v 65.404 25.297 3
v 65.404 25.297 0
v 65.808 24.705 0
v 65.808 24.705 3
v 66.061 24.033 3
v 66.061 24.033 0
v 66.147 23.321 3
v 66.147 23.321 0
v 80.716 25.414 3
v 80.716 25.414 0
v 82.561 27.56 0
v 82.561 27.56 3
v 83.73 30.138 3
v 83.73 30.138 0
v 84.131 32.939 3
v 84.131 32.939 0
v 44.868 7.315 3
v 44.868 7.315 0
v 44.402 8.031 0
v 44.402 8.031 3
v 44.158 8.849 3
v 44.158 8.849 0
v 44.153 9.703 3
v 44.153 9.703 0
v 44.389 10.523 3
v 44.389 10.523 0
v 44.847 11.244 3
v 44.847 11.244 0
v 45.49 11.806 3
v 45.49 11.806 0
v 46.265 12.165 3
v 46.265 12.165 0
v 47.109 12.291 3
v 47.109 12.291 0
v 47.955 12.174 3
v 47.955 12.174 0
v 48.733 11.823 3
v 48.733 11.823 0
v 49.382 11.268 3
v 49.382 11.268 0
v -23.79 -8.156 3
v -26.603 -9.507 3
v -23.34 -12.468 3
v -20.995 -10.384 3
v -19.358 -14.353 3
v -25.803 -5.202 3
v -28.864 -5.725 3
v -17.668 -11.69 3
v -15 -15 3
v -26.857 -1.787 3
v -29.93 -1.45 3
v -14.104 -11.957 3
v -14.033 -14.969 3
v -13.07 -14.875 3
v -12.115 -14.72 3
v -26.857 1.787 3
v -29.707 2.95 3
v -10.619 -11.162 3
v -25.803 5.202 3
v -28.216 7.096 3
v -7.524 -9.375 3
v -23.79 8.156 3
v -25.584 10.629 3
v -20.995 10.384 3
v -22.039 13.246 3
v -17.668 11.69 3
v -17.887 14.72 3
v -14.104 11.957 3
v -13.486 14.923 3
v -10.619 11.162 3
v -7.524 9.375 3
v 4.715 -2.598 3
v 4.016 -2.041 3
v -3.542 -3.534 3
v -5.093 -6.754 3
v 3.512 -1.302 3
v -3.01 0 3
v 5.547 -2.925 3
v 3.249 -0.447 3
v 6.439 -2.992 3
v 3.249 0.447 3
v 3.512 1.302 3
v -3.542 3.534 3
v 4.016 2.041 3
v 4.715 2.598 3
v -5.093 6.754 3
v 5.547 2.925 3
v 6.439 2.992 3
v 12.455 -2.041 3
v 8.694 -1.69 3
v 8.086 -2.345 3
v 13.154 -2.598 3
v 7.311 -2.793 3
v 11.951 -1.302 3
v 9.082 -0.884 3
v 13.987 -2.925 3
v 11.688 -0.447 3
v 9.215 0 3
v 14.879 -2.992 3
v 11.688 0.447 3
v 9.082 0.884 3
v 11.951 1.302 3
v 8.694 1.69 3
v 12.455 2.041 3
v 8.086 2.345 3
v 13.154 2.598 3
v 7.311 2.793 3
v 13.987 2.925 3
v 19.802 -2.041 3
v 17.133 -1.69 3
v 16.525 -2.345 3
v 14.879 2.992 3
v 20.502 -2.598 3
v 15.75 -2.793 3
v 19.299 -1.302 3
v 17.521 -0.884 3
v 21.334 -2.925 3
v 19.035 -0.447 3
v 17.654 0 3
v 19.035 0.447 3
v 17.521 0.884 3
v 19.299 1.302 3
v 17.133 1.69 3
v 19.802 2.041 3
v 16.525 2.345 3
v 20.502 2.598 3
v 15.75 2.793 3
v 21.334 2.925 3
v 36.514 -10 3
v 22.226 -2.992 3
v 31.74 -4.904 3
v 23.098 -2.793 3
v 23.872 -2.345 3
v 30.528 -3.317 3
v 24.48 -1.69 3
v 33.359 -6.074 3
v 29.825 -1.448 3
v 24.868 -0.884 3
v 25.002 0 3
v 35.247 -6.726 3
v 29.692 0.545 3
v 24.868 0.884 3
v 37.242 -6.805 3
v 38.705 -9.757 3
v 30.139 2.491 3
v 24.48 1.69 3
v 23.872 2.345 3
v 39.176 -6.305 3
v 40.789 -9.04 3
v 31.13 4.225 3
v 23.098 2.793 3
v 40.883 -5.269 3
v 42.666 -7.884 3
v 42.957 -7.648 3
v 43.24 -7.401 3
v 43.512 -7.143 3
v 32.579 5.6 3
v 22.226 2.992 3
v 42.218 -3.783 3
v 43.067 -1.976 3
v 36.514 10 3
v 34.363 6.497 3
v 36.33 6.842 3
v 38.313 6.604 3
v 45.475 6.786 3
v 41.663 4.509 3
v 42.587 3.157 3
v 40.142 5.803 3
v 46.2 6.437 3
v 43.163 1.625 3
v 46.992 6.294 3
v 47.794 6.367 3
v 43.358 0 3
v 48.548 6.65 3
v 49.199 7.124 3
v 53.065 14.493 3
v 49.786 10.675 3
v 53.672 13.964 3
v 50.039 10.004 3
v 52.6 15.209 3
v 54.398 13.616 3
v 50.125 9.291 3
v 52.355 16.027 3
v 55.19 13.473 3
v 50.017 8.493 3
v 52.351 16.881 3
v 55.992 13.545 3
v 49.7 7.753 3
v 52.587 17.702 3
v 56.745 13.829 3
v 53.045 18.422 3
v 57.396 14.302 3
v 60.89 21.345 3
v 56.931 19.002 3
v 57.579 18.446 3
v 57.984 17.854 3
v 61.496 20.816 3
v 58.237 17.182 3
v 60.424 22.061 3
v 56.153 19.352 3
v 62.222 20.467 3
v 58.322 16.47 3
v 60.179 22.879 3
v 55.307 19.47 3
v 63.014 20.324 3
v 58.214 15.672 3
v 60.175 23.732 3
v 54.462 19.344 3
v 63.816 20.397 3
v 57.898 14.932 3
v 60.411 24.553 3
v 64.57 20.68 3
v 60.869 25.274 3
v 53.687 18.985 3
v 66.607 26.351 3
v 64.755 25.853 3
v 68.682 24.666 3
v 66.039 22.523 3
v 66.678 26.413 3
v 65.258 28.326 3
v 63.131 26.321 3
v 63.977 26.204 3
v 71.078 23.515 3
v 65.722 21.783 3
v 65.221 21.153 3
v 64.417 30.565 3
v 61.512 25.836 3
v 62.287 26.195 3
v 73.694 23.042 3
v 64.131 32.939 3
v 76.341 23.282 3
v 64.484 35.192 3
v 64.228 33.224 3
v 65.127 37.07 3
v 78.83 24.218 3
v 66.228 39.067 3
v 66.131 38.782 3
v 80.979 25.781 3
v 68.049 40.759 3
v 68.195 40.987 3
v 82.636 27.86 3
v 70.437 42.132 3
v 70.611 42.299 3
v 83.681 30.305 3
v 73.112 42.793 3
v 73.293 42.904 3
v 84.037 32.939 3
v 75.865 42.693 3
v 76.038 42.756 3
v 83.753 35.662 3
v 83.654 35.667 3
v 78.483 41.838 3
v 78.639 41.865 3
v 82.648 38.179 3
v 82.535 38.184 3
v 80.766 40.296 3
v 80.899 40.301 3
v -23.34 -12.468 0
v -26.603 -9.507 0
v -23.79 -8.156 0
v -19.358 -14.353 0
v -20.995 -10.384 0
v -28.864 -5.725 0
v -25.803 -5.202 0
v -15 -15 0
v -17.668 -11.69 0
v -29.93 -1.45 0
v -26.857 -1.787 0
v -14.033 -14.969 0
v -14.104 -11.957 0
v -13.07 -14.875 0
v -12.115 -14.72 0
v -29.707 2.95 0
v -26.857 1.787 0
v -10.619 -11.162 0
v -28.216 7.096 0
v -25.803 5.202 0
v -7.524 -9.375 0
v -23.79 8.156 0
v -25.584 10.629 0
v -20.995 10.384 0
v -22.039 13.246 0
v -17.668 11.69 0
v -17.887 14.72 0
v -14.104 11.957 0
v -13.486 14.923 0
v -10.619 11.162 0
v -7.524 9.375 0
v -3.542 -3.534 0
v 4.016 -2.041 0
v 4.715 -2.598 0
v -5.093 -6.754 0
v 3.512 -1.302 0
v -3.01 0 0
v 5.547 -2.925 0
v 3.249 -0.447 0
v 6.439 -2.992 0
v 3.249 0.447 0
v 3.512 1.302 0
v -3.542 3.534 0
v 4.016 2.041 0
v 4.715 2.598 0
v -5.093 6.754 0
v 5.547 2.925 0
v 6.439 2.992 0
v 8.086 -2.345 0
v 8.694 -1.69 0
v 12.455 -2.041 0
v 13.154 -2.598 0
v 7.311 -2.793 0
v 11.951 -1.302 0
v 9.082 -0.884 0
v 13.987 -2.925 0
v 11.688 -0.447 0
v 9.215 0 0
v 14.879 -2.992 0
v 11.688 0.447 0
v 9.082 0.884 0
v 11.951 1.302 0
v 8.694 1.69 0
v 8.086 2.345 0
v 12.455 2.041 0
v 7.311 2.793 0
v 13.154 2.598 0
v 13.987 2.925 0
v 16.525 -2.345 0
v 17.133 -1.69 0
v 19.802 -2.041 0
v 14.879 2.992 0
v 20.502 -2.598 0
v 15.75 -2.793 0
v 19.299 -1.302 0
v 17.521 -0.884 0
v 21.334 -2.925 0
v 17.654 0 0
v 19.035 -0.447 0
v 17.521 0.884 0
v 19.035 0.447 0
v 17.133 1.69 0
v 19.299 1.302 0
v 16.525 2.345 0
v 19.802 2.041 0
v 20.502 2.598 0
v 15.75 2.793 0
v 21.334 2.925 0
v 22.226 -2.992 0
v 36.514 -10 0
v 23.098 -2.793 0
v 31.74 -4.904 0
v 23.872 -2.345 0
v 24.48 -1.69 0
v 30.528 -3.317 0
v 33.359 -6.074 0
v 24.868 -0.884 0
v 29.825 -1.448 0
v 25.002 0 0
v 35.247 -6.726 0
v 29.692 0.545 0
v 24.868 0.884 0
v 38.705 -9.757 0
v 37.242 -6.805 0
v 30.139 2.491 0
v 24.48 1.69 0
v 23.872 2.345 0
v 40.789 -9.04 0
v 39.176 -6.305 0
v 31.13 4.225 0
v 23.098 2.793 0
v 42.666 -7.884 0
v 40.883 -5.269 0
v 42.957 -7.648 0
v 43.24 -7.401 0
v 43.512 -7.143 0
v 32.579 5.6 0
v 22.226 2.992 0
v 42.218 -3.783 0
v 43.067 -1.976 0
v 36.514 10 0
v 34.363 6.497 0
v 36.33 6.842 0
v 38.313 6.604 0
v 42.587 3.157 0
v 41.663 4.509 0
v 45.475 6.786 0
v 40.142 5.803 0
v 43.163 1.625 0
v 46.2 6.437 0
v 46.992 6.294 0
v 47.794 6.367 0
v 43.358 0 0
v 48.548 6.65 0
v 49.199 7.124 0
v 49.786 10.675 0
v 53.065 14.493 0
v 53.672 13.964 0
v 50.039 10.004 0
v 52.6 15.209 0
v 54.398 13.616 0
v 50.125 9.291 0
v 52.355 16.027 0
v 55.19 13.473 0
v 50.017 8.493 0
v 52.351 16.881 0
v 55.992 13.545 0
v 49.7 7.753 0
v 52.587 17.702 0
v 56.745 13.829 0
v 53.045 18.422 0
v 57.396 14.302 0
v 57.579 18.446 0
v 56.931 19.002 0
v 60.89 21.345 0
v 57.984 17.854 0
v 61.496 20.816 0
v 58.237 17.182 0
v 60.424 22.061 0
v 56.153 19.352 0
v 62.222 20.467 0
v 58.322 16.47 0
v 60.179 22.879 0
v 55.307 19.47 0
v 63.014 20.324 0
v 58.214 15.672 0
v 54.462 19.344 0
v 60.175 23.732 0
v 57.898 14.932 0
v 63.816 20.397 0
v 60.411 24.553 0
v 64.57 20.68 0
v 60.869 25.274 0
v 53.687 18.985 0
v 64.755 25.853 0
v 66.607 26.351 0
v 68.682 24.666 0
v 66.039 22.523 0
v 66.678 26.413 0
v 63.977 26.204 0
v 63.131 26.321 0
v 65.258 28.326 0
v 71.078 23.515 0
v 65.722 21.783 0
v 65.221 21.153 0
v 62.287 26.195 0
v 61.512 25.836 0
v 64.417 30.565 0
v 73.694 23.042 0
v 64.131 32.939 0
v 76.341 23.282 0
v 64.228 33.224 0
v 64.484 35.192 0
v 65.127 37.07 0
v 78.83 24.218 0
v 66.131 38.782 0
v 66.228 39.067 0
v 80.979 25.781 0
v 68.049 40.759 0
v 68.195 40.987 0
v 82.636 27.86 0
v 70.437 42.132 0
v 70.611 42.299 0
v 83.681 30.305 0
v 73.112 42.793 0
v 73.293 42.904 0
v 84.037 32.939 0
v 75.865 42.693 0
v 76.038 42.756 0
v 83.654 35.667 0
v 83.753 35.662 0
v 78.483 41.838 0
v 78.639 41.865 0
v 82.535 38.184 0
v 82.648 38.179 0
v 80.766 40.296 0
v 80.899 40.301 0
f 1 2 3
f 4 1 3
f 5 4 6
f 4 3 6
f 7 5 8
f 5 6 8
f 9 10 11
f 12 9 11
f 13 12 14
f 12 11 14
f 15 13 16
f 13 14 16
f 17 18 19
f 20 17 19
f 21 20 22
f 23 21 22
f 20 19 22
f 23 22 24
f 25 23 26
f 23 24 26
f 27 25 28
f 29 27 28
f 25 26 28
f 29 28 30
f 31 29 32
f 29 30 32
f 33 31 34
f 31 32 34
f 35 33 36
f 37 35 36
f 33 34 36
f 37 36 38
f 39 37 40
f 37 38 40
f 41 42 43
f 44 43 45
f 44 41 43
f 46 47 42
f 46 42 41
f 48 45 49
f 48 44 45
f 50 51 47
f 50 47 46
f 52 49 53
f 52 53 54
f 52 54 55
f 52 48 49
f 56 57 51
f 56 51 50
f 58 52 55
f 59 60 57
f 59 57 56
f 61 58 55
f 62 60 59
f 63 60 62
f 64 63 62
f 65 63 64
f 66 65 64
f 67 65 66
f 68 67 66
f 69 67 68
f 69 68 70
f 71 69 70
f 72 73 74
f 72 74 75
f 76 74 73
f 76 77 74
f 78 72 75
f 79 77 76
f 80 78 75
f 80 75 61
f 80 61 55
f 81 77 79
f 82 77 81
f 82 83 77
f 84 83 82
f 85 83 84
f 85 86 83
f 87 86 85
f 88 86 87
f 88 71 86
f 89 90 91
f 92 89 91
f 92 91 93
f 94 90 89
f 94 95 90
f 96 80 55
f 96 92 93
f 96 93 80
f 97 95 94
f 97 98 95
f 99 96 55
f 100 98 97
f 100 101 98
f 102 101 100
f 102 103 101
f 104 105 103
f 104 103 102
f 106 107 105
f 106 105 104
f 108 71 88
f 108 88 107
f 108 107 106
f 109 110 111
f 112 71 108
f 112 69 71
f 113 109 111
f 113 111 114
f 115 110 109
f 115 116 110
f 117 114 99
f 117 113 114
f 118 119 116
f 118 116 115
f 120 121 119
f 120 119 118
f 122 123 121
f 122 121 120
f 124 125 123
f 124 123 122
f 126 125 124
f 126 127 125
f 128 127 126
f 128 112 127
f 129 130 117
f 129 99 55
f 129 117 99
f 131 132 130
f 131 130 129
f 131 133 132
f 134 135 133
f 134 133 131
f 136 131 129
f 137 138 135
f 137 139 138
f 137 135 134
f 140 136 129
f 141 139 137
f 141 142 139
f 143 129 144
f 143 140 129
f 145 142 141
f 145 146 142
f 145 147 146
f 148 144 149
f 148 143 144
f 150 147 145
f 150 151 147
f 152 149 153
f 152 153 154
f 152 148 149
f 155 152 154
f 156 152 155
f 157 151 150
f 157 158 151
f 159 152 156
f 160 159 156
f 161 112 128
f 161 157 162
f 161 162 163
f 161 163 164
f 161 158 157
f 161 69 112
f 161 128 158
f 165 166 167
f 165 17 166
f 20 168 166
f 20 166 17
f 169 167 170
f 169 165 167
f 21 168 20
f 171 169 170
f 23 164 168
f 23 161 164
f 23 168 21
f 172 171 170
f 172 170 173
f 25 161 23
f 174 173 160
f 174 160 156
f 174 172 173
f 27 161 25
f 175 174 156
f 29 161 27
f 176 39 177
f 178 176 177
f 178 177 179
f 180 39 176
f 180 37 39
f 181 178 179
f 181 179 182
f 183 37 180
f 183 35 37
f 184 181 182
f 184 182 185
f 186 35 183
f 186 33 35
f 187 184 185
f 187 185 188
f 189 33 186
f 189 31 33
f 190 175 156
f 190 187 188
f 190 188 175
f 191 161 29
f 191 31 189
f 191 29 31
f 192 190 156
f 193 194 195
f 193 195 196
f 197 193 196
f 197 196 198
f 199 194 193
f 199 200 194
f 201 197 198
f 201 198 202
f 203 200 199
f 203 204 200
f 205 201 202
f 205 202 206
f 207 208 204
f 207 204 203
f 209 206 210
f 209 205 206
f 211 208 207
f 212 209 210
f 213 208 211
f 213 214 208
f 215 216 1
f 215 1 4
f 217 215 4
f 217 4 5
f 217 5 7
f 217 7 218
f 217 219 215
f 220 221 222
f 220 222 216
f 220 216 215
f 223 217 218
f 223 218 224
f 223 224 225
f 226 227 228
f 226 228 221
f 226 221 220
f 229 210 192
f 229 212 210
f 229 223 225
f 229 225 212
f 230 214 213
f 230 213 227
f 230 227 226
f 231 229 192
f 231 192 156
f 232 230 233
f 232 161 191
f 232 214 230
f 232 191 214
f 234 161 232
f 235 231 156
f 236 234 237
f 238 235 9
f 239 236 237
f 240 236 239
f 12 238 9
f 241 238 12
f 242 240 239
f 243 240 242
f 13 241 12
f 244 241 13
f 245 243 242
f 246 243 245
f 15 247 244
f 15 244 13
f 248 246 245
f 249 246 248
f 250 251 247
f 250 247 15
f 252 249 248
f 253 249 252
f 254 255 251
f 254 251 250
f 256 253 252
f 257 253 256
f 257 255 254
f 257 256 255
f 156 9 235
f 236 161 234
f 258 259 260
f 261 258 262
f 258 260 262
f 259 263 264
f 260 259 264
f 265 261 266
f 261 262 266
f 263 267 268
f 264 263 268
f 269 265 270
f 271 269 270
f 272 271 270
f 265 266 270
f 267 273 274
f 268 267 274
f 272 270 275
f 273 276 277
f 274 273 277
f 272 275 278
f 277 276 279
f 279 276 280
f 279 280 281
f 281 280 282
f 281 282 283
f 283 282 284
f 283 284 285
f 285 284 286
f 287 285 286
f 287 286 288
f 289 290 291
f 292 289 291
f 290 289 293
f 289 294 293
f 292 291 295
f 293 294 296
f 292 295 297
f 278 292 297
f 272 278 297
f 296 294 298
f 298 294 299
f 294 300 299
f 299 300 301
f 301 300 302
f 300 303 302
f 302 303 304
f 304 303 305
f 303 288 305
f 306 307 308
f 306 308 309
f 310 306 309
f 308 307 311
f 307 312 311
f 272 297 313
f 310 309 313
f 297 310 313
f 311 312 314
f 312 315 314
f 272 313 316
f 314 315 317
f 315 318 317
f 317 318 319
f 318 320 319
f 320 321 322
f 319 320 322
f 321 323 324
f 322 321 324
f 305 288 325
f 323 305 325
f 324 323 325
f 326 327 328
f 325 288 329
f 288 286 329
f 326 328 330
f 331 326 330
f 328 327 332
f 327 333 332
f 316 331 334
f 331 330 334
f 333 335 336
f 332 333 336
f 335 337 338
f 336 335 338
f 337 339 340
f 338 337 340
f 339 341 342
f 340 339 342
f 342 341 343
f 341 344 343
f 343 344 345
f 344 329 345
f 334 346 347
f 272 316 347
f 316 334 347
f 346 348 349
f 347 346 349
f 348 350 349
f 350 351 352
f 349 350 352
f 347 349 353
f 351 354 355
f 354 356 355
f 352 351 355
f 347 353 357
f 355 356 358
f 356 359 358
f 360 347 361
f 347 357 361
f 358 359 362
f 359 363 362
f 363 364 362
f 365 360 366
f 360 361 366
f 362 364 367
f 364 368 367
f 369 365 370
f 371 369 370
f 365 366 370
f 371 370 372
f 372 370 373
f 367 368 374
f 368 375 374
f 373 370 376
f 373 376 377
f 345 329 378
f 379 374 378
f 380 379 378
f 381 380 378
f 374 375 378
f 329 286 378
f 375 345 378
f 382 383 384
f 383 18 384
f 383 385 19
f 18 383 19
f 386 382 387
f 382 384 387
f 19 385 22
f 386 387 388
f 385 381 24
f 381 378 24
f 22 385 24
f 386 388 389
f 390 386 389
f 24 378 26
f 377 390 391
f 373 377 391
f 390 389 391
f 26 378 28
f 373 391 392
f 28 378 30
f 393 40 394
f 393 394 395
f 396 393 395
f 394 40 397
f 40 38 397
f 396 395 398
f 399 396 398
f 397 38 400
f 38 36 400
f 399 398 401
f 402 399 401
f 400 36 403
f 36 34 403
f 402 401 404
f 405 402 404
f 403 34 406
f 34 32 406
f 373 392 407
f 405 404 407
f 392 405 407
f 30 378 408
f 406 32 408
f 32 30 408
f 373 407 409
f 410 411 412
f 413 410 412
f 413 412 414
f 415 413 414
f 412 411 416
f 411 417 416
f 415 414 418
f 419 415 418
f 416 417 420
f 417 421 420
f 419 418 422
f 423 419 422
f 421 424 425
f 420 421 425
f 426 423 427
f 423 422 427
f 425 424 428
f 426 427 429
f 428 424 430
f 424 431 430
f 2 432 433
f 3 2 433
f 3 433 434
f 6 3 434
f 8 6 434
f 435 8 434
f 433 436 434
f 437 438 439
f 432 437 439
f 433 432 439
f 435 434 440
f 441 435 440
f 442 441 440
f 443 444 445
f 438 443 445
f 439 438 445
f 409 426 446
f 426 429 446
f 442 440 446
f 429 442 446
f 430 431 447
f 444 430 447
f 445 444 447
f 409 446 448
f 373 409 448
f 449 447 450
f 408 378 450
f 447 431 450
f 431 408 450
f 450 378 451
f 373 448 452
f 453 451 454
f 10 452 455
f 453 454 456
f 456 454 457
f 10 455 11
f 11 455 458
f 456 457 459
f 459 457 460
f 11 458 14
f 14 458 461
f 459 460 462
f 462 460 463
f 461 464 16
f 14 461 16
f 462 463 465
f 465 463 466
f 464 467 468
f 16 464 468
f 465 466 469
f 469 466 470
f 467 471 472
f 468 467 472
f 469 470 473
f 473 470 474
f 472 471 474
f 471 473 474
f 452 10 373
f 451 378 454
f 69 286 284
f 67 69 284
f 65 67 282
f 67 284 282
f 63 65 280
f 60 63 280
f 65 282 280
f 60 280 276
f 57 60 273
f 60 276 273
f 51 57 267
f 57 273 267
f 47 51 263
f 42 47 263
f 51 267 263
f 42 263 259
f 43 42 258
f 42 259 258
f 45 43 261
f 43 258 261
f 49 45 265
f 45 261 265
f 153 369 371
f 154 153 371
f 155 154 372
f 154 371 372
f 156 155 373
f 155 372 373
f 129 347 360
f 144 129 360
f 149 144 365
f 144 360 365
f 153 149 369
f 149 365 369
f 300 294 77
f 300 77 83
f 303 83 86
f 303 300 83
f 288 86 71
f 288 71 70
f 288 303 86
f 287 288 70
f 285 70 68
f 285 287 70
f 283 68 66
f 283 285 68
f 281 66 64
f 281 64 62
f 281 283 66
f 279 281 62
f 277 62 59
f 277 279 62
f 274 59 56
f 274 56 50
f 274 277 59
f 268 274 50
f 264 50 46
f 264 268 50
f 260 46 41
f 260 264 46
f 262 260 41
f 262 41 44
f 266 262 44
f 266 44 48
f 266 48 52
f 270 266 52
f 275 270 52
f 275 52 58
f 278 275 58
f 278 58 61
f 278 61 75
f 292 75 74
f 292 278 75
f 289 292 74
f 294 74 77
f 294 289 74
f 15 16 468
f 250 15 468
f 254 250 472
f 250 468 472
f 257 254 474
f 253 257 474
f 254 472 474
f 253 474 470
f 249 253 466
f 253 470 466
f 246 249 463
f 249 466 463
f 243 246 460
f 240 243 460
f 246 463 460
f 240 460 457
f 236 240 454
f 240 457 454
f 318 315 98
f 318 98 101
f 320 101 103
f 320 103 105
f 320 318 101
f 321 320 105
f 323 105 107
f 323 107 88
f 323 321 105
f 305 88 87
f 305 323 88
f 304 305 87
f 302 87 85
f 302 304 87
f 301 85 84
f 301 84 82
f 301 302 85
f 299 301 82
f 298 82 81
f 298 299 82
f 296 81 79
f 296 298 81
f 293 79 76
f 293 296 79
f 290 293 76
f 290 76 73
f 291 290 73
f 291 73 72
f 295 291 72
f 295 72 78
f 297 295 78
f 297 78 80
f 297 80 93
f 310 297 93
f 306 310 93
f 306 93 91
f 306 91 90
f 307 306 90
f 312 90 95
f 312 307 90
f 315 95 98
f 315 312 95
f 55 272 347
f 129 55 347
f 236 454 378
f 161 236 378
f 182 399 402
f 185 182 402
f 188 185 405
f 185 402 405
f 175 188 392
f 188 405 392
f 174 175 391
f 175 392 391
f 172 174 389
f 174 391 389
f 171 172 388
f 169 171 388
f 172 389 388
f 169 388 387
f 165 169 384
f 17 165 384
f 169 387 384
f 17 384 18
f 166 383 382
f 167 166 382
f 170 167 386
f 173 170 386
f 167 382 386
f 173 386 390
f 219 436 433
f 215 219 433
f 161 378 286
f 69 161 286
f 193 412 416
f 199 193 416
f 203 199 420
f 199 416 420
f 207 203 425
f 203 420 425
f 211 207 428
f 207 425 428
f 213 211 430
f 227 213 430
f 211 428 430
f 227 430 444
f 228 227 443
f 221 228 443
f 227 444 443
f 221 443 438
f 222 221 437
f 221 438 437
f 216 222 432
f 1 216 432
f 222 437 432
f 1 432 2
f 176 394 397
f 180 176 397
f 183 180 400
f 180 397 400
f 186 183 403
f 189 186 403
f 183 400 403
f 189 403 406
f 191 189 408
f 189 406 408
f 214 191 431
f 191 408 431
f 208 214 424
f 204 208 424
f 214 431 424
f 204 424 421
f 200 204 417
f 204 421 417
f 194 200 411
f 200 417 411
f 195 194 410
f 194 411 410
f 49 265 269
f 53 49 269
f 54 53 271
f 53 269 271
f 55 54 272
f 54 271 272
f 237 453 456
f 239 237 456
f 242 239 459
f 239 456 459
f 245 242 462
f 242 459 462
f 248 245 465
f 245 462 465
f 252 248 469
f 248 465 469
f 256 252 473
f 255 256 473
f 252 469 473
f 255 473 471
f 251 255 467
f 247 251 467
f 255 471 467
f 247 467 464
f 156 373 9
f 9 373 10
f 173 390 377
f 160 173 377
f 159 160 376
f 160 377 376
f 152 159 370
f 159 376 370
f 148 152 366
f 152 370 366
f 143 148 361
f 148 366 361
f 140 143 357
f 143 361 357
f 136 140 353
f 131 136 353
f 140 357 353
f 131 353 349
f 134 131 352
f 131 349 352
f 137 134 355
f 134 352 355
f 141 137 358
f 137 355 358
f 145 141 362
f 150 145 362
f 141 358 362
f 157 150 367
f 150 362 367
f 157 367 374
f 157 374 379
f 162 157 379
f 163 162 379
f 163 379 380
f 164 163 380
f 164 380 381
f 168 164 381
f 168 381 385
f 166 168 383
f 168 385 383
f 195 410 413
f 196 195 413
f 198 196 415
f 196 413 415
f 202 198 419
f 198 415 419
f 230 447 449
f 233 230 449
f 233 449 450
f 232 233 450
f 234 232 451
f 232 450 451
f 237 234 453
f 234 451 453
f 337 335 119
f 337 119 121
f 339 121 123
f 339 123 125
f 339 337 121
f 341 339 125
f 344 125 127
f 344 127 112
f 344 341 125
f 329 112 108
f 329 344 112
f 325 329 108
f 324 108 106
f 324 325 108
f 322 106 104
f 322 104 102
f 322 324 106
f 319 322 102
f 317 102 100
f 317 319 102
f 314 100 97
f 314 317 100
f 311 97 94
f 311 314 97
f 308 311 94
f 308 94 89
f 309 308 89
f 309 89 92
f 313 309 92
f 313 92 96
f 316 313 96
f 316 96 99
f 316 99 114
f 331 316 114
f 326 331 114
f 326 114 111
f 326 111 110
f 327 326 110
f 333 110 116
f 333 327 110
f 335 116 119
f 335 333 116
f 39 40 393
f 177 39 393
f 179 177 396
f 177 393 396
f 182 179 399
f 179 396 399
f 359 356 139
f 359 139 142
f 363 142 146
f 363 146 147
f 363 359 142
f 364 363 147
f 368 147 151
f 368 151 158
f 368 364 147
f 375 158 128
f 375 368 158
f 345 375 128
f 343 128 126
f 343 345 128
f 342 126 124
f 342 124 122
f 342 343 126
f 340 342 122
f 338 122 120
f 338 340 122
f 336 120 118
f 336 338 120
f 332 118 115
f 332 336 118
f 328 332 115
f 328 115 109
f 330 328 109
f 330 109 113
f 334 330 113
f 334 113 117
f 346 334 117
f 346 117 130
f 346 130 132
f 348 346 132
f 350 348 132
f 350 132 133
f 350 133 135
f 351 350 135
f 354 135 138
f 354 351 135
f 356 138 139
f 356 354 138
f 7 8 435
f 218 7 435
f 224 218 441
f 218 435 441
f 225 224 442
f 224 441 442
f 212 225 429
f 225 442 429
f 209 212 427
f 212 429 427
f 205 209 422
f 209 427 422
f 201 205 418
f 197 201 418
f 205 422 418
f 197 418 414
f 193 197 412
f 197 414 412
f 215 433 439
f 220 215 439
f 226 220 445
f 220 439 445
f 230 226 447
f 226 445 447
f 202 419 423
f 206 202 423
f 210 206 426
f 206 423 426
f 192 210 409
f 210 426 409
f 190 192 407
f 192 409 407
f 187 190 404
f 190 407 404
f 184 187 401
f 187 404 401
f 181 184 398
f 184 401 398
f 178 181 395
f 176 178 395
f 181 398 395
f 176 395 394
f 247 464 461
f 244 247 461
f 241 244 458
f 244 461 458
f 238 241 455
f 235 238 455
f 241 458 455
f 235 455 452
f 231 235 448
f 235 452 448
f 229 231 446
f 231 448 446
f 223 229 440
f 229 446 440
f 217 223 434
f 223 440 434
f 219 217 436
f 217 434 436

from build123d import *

# Parameters (mm, degrees)
F0_R     = 11.9904594856
F0_R_2   = 3
F1_DEPTH = 3


with BuildPart() as f1:
    # F0 (on Top) → F1 (new body)
    with BuildSketch(Plane.XY):
        with BuildLine():
            ThreePointArc((-12.1153572012, -14.7200148072), (-3.4183411814, -9.5323228549), (0, 0))
            ThreePointArc((0, 0), (-3.8709155487, 10.0570114485), (-13.4857972368, 14.9233772985))
            ThreePointArc((-13.4857972368, 14.9233772985), (-29.9808320776, 0.7580700902), (-15, -15))
            Line((-15, -15), (-12.1153572012, -14.7200148072))
        make_face()
        with Locations((-15, 0)):
            Circle(F0_R, mode=Mode.SUBTRACT)
        with BuildLine():
            ThreePointArc((-13.4857972368, 14.9233772985), (-3.8709155487, 10.0570114485), (0, 0))
            ThreePointArc((0, 0), (-3.4183411814, -9.5323228549), (-12.1153572012, -14.7200148072))
            Line((-12.1153572012, -14.7200148072), (36.5142027632, -10))
            ThreePointArc((36.5142027632, -10), (26.5142027632, 0), (36.5142027632, 10))
            Line((36.5142027632, 10), (-13.4857972368, 14.9233772985))
        make_face()
        with Locations((6.2150359154, 0)):
            Circle(F0_R_2, mode=Mode.SUBTRACT)
        with Locations((14.6543458104, 0)):
            Circle(F0_R_2, mode=Mode.SUBTRACT)
        with Locations((22.0015123487, 0)):
            Circle(F0_R_2, mode=Mode.SUBTRACT)
        with BuildLine():
            ThreePointArc((-15, -15), (-13.5509006431, -14.9298396192), (-12.1153572012, -14.7200148072))
            Line((-12.1153572012, -14.7200148072), (-15, -15))
        make_face()
        with BuildLine():
            ThreePointArc((44.0375149849, 6.5878504245), (40.6446685817, 9.107098996), (36.5142027632, 10))
            ThreePointArc((36.5142027632, 10), (26.5142027632, 0), (36.5142027632, -10))
            ThreePointArc((36.5142027632, -10), (39.7671043031, -9.4561425313), (42.6661828836, -7.8837263143))
            Line((42.6661828836, -7.8837263143), (43.5123325587, -7.1432611156))
            ThreePointArc((43.5123325587, -7.1432611156), (45.7332400761, -3.8741903699), (46.5142027632, 0))
            ThreePointArc((46.5142027632, 0), (45.8745746099, 3.5190110673), (44.0375149849, 6.5878504245))
        make_face()
        with BuildLine():
            ThreePointArc((43.3583631677, 0), (30.1078141267, -2.408467621), (41.6632783251, 4.5088305026))
            ThreePointArc((41.6632783251, 4.5088305026), (42.9205913997, 2.408467621), (43.3583631677, 0))
        make_face(mode=Mode.SUBTRACT)
        with BuildLine():
            Line((66.2282739463, 39.0671108823), (36.5142027632, 10))
            ThreePointArc((36.5142027632, 10), (40.6446685817, 9.107098996), (44.0375149849, 6.5878504245))
            Line((44.0375149849, 6.5878504245), (44.8677292107, 7.3148343617))
            ThreePointArc((44.8677292107, 7.3148343617), (45.1483677498, 11.5481831556), (49.3817165437, 11.2675446164))
            Line((49.3817165437, 11.2675446164), (53.0654896509, 14.4932709338))
            ThreePointArc((53.0654896509, 14.4932709338), (53.34612819, 18.7266197277), (57.5794769839, 18.4459811885))
            Line((57.5794769839, 18.4459811885), (60.8896796087, 21.3445874307))
            ThreePointArc((60.8896796087, 21.3445874307), (61.1703181479, 25.5779362245), (65.4036669417, 25.2972976854))
            Line((65.4036669417, 25.2972976854), (66.6074516499, 26.3514016979))
            ThreePointArc((66.6074516499, 26.3514016979), (64.7703920248, 29.4202410551), (64.1307638715, 32.9392521224))
            ThreePointArc((64.1307638715, 32.9392521224), (64.669661947, 36.1777008828), (66.2282739463, 39.0671108823))
        make_face()
        with BuildLine():
            Line((44.8677292107, 7.3148343617), (44.0375149849, 6.5878504245))
            ThreePointArc((44.0375149849, 6.5878504245), (45.8745746099, 3.5190110673), (46.5142027632, 0))
            ThreePointArc((46.5142027632, 0), (45.7332400761, -3.8741903699), (43.5123325587, -7.1432611156))
            Line((43.5123325587, -7.1432611156), (80.7162342327, 25.4138564436))
            ThreePointArc((80.7162342327, 25.4138564436), (73.4677143901, 22.9612580662), (66.6074516499, 26.3514016979))
            Line((66.6074516499, 26.3514016979), (65.4036669417, 25.2972976854))
            ThreePointArc((65.4036669417, 25.2972976854), (65.9547848292, 24.3766458782), (66.1466732752, 23.320942558))
            ThreePointArc((66.1466732752, 23.320942558), (64.2023765954, 20.512831004), (60.8896796087, 21.3445874307))
            Line((60.8896796087, 21.3445874307), (57.5794769839, 18.4459811885))
            ThreePointArc((57.5794769839, 18.4459811885), (58.1305948714, 17.5253293814), (58.3224833174, 16.4696260612))
            ThreePointArc((58.3224833174, 16.4696260612), (56.3781866375, 13.6615145072), (53.0654896509, 14.4932709338))
            Line((53.0654896509, 14.4932709338), (49.3817165437, 11.2675446164))
            ThreePointArc((49.3817165437, 11.2675446164), (49.9328344312, 10.3468928092), (50.1247228772, 9.2911894891))
            ThreePointArc((50.1247228772, 9.2911894891), (48.1804261974, 6.4830779351), (44.8677292107, 7.3148343617))
        make_face()
        with BuildLine():
            Line((66.1307166189, 38.7820979372), (66.2282739463, 39.0671108823))
            ThreePointArc((66.2282739463, 39.0671108823), (64.669661947, 36.1777008828), (64.1307638715, 32.9392521224))
            Line((64.1307638715, 32.9392521224), (64.228321199, 33.2242650675))
            ThreePointArc((64.228321199, 33.2242650675), (64.7580821351, 36.1474354602), (66.1307166189, 38.7820979372))
        make_face()
        with BuildLine():
            ThreePointArc((84.1307638715, 32.9392521224), (77.369212632, 42.4003540469), (66.2282739463, 39.0671108823))
            Line((66.2282739463, 39.0671108823), (66.1307166189, 38.7820979372))
            ThreePointArc((66.1307166189, 38.7820979372), (77.2037744065, 42.3571186277), (84.0373073283, 32.9392521224))
            ThreePointArc((84.0373073283, 32.9392521224), (77.6168874778, 23.6663590753), (66.6777619252, 26.4129694707))
            Line((66.6777619252, 26.4129694707), (66.6074516499, 26.3514016979))
            ThreePointArc((66.6074516499, 26.3514016979), (73.4677143901, 22.9612580662), (80.7162342327, 25.4138564436))
            ThreePointArc((80.7162342327, 25.4138564436), (83.2372094902, 28.8073460012), (84.1307638715, 32.9392521224))
        make_face()
        with BuildLine():
            Line((43.5123325587, -7.1432611156), (42.6661828836, -7.8837263143))
            ThreePointArc((42.6661828836, -7.8837263143), (43.0996731243, -7.5253956788), (43.5123325587, -7.1432611156))
        make_face()
    extrude(amount=F1_DEPTH)


solid = f1.part
